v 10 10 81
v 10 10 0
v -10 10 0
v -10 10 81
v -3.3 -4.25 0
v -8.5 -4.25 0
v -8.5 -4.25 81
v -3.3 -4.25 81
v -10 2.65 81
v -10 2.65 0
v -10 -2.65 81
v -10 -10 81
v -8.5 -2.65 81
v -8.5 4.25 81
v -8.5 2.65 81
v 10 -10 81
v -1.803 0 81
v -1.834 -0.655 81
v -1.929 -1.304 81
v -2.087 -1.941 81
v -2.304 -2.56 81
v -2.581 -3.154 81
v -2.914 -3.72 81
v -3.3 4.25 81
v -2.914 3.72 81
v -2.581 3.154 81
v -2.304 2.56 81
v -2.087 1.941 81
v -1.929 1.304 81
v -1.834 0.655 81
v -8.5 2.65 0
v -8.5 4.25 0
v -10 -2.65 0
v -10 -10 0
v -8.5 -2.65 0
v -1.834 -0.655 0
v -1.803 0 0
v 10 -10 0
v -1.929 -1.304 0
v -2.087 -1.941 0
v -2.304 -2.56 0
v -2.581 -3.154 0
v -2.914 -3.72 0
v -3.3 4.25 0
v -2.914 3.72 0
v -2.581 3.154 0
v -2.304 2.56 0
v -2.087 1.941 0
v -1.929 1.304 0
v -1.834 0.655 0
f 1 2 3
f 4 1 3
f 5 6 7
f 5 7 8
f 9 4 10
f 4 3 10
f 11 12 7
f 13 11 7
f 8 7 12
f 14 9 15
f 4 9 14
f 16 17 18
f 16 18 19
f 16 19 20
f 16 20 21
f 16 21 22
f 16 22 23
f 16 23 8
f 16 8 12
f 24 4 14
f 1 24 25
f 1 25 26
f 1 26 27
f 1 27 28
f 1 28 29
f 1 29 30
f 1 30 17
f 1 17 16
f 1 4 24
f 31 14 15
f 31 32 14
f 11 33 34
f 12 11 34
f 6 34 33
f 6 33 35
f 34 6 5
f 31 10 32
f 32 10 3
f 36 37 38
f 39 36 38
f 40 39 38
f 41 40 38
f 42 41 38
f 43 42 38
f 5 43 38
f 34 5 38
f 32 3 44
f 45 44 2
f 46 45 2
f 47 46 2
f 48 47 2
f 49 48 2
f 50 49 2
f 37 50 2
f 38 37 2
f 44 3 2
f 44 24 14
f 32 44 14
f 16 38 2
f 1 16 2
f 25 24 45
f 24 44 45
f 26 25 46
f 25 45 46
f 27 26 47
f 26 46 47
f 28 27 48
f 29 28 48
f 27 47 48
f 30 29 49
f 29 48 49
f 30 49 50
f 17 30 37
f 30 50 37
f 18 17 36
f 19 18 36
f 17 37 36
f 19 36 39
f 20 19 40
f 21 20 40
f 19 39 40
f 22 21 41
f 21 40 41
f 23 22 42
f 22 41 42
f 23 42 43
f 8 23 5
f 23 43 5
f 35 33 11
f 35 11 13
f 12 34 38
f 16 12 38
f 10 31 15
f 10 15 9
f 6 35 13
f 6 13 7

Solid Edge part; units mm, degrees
sketch "Sketch1" plane through (0, 0, 0) normal (0, 0, 1) x (1, 0, 0)
  line L0 (-10, -10) -> (10, -10)
  line L1 (10, -10) -> (10, 10)
  line L2 (10, 10) -> (-10, 10)
  line L3 (-10, 10) -> (-10, 2.65)
  line L4 (-8.5, 2.65) -> (-10, 2.65)
  line L5 (-8.5, 4.25) -> (-8.5, 2.65)
  line L6 (-3.3, 4.25) -> (-8.5, 4.25)
  arc A0 (-3.3, 4.25) -> (-3.3, -4.25) centre (-8.5833, 0) cw
  line L7 (-8.5, -4.25) -> (-3.3, -4.25)
  line L8 (-8.5, -2.65) -> (-8.5, -4.25)
  line L9 (-10, -2.65) -> (-8.5, -2.65)
  line L10 (-10, -2.65) -> (-10, -10)
extrude "Protrusion1" add sketch "Sketch1" along normal blind 81
